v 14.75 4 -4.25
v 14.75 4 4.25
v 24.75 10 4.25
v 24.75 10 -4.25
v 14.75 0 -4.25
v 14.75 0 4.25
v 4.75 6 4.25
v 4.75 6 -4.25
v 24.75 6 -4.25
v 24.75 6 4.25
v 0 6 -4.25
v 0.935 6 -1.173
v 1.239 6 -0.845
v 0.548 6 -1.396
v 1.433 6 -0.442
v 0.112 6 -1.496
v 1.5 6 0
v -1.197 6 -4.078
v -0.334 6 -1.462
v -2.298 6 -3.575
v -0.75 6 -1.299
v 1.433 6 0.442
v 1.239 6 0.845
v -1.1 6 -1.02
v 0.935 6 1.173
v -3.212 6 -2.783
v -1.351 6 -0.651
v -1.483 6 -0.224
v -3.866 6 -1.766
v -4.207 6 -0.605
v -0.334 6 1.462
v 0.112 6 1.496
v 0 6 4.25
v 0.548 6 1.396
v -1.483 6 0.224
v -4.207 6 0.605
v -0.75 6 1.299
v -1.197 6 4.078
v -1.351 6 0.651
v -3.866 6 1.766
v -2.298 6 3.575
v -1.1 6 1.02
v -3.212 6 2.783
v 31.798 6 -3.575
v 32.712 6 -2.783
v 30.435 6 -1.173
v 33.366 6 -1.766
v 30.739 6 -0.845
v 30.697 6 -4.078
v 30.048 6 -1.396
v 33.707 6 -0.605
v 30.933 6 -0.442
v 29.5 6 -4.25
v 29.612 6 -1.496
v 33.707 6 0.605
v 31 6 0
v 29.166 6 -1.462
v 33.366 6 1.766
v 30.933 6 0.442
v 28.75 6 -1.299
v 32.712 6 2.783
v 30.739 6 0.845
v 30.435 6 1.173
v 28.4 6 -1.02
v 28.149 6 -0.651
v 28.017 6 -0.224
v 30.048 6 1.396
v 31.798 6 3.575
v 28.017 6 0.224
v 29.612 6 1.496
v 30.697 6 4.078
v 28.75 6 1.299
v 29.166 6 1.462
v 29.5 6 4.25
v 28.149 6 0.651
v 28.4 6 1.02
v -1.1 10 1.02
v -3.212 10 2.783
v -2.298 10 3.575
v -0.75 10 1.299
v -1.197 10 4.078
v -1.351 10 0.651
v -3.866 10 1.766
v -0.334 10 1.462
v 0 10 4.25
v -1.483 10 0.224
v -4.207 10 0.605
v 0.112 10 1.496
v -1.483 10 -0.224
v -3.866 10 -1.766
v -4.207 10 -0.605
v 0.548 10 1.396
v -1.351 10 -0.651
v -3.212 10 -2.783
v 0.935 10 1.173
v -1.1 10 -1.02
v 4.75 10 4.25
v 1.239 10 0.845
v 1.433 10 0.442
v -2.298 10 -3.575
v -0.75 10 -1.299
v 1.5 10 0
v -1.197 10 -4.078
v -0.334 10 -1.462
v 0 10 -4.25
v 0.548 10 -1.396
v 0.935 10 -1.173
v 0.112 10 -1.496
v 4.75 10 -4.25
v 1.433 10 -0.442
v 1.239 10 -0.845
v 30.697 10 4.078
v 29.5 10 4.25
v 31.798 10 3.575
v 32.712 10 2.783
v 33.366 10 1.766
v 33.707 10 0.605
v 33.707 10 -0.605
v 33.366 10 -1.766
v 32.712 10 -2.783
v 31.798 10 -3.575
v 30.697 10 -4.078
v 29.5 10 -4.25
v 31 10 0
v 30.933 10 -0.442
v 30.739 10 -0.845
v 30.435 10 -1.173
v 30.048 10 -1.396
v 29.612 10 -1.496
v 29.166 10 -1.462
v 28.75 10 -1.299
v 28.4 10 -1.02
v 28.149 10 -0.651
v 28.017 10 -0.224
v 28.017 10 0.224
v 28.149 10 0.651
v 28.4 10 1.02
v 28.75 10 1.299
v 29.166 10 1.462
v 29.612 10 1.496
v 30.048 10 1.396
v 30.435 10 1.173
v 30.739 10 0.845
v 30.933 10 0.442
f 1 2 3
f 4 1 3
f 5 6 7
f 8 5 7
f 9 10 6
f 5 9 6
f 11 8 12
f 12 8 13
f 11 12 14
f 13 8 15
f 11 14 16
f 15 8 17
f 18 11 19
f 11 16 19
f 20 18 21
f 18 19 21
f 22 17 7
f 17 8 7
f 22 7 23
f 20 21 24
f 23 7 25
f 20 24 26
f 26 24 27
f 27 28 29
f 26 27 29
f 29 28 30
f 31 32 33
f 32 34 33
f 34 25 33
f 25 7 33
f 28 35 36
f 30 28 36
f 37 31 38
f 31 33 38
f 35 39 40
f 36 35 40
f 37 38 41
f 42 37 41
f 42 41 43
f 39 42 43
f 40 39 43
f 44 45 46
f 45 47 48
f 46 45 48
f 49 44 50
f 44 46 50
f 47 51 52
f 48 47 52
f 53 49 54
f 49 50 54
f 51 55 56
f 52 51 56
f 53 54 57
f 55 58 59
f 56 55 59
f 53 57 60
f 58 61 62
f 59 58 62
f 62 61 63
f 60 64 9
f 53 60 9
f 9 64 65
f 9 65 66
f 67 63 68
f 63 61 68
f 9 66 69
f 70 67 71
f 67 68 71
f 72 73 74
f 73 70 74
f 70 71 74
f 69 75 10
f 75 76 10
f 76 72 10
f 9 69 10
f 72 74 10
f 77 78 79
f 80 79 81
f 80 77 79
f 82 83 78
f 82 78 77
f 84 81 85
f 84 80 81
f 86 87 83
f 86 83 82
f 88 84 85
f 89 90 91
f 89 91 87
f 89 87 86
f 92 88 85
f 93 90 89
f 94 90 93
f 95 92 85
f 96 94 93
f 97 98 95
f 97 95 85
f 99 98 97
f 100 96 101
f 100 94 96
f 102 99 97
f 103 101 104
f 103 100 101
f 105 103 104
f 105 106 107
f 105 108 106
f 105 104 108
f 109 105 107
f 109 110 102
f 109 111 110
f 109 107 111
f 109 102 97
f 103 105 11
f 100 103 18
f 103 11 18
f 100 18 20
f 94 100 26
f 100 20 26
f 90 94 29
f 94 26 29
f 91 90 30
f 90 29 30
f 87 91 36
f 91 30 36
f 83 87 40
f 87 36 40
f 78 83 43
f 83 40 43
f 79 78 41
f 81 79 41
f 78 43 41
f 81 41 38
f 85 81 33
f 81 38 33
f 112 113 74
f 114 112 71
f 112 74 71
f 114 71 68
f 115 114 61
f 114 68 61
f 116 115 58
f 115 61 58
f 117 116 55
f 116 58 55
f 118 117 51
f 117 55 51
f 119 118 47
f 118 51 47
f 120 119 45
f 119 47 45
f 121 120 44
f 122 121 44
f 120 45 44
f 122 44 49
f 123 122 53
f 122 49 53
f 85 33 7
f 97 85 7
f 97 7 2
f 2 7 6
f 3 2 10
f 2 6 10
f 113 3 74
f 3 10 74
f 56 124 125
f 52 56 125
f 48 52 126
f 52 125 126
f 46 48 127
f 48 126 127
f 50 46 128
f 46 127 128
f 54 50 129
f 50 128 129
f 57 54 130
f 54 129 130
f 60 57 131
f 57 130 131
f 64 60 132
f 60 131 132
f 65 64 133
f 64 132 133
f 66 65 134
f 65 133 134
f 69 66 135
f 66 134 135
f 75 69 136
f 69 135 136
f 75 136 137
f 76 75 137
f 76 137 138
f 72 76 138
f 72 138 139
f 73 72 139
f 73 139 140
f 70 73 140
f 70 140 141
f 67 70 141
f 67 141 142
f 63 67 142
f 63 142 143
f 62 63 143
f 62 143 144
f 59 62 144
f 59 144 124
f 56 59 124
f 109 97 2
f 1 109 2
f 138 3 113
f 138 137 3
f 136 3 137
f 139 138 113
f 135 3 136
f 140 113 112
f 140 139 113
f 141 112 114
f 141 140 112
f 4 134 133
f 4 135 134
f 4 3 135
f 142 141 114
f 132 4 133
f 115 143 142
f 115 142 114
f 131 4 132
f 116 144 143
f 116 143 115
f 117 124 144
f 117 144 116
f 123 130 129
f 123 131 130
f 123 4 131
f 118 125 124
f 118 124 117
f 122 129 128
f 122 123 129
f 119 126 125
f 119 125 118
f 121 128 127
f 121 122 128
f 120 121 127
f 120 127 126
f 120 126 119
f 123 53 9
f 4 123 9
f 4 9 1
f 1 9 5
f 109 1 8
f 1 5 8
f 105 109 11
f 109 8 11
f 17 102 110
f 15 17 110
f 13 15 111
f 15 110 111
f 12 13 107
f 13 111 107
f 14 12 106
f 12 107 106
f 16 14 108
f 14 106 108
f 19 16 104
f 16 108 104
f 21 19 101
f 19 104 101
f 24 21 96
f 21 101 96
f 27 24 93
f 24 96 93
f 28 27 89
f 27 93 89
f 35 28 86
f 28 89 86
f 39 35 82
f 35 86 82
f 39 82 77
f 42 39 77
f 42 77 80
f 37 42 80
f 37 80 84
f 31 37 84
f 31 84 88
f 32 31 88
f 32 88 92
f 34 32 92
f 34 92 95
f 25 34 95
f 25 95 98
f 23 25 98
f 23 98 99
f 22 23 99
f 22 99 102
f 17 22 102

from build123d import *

# Parameters (mm, degrees)
BOSS_EXTRUDE1_DEPTH = 10
SKETCH3_W           = 4.25
SKETCH3_H           = 6
CUT_EXTRUDE1_DEPTH  = 10
SKETCH4_R           = 1.5
CUT_EXTRUDE2_DEPTH  = 11


with BuildPart() as part:
    # Sketch2 → Boss-Extrude1 (new body)
    with BuildSketch(Plane(origin=(0, 0, 0), x_dir=(1, 0, 0), z_dir=(0, 1, 0))):
        with BuildLine():
            Line((0, -4.25), (29.5, -4.25))
            ThreePointArc((29.5, -4.25), (33.75, 0), (29.5, 4.25))
            Line((29.5, 4.25), (0, 4.25))
            ThreePointArc((0, 4.25), (-4.25, 0), (0, -4.25))
        make_face()
    extrude(amount=BOSS_EXTRUDE1_DEPTH)

    # Sketch3 → Cut-Extrude1 (cut)
    with BuildSketch(Plane.XY.offset(4.25)):
        Polygon((24.75, 10), (4.75, 10), (14.75, 4), align=None)
        Polygon((4.75, 6), (0, 6), (0, 0), (14.75, 0), align=None)
        with Locations((-2.125, 3)):
            Rectangle(SKETCH3_W, SKETCH3_H)
        Polygon((29.5, 0), (29.5, 6), (24.75, 6), (14.75, 0), align=None)
        with Locations((31.625, 3)):
            Rectangle(SKETCH3_W, SKETCH3_H)
    extrude(amount=-CUT_EXTRUDE1_DEPTH, mode=Mode.SUBTRACT)

    # Sketch4 → Cut-Extrude2 (cut, through all)
    with BuildSketch(Plane(origin=(0, 10, 0), x_dir=(1, 0, 0), z_dir=(0, 1, 0))):
        Circle(SKETCH4_R)
        with Locations((29.5, 0)):
            Circle(SKETCH4_R)
    extrude(amount=-CUT_EXTRUDE2_DEPTH, mode=Mode.SUBTRACT)


solid = part.part
